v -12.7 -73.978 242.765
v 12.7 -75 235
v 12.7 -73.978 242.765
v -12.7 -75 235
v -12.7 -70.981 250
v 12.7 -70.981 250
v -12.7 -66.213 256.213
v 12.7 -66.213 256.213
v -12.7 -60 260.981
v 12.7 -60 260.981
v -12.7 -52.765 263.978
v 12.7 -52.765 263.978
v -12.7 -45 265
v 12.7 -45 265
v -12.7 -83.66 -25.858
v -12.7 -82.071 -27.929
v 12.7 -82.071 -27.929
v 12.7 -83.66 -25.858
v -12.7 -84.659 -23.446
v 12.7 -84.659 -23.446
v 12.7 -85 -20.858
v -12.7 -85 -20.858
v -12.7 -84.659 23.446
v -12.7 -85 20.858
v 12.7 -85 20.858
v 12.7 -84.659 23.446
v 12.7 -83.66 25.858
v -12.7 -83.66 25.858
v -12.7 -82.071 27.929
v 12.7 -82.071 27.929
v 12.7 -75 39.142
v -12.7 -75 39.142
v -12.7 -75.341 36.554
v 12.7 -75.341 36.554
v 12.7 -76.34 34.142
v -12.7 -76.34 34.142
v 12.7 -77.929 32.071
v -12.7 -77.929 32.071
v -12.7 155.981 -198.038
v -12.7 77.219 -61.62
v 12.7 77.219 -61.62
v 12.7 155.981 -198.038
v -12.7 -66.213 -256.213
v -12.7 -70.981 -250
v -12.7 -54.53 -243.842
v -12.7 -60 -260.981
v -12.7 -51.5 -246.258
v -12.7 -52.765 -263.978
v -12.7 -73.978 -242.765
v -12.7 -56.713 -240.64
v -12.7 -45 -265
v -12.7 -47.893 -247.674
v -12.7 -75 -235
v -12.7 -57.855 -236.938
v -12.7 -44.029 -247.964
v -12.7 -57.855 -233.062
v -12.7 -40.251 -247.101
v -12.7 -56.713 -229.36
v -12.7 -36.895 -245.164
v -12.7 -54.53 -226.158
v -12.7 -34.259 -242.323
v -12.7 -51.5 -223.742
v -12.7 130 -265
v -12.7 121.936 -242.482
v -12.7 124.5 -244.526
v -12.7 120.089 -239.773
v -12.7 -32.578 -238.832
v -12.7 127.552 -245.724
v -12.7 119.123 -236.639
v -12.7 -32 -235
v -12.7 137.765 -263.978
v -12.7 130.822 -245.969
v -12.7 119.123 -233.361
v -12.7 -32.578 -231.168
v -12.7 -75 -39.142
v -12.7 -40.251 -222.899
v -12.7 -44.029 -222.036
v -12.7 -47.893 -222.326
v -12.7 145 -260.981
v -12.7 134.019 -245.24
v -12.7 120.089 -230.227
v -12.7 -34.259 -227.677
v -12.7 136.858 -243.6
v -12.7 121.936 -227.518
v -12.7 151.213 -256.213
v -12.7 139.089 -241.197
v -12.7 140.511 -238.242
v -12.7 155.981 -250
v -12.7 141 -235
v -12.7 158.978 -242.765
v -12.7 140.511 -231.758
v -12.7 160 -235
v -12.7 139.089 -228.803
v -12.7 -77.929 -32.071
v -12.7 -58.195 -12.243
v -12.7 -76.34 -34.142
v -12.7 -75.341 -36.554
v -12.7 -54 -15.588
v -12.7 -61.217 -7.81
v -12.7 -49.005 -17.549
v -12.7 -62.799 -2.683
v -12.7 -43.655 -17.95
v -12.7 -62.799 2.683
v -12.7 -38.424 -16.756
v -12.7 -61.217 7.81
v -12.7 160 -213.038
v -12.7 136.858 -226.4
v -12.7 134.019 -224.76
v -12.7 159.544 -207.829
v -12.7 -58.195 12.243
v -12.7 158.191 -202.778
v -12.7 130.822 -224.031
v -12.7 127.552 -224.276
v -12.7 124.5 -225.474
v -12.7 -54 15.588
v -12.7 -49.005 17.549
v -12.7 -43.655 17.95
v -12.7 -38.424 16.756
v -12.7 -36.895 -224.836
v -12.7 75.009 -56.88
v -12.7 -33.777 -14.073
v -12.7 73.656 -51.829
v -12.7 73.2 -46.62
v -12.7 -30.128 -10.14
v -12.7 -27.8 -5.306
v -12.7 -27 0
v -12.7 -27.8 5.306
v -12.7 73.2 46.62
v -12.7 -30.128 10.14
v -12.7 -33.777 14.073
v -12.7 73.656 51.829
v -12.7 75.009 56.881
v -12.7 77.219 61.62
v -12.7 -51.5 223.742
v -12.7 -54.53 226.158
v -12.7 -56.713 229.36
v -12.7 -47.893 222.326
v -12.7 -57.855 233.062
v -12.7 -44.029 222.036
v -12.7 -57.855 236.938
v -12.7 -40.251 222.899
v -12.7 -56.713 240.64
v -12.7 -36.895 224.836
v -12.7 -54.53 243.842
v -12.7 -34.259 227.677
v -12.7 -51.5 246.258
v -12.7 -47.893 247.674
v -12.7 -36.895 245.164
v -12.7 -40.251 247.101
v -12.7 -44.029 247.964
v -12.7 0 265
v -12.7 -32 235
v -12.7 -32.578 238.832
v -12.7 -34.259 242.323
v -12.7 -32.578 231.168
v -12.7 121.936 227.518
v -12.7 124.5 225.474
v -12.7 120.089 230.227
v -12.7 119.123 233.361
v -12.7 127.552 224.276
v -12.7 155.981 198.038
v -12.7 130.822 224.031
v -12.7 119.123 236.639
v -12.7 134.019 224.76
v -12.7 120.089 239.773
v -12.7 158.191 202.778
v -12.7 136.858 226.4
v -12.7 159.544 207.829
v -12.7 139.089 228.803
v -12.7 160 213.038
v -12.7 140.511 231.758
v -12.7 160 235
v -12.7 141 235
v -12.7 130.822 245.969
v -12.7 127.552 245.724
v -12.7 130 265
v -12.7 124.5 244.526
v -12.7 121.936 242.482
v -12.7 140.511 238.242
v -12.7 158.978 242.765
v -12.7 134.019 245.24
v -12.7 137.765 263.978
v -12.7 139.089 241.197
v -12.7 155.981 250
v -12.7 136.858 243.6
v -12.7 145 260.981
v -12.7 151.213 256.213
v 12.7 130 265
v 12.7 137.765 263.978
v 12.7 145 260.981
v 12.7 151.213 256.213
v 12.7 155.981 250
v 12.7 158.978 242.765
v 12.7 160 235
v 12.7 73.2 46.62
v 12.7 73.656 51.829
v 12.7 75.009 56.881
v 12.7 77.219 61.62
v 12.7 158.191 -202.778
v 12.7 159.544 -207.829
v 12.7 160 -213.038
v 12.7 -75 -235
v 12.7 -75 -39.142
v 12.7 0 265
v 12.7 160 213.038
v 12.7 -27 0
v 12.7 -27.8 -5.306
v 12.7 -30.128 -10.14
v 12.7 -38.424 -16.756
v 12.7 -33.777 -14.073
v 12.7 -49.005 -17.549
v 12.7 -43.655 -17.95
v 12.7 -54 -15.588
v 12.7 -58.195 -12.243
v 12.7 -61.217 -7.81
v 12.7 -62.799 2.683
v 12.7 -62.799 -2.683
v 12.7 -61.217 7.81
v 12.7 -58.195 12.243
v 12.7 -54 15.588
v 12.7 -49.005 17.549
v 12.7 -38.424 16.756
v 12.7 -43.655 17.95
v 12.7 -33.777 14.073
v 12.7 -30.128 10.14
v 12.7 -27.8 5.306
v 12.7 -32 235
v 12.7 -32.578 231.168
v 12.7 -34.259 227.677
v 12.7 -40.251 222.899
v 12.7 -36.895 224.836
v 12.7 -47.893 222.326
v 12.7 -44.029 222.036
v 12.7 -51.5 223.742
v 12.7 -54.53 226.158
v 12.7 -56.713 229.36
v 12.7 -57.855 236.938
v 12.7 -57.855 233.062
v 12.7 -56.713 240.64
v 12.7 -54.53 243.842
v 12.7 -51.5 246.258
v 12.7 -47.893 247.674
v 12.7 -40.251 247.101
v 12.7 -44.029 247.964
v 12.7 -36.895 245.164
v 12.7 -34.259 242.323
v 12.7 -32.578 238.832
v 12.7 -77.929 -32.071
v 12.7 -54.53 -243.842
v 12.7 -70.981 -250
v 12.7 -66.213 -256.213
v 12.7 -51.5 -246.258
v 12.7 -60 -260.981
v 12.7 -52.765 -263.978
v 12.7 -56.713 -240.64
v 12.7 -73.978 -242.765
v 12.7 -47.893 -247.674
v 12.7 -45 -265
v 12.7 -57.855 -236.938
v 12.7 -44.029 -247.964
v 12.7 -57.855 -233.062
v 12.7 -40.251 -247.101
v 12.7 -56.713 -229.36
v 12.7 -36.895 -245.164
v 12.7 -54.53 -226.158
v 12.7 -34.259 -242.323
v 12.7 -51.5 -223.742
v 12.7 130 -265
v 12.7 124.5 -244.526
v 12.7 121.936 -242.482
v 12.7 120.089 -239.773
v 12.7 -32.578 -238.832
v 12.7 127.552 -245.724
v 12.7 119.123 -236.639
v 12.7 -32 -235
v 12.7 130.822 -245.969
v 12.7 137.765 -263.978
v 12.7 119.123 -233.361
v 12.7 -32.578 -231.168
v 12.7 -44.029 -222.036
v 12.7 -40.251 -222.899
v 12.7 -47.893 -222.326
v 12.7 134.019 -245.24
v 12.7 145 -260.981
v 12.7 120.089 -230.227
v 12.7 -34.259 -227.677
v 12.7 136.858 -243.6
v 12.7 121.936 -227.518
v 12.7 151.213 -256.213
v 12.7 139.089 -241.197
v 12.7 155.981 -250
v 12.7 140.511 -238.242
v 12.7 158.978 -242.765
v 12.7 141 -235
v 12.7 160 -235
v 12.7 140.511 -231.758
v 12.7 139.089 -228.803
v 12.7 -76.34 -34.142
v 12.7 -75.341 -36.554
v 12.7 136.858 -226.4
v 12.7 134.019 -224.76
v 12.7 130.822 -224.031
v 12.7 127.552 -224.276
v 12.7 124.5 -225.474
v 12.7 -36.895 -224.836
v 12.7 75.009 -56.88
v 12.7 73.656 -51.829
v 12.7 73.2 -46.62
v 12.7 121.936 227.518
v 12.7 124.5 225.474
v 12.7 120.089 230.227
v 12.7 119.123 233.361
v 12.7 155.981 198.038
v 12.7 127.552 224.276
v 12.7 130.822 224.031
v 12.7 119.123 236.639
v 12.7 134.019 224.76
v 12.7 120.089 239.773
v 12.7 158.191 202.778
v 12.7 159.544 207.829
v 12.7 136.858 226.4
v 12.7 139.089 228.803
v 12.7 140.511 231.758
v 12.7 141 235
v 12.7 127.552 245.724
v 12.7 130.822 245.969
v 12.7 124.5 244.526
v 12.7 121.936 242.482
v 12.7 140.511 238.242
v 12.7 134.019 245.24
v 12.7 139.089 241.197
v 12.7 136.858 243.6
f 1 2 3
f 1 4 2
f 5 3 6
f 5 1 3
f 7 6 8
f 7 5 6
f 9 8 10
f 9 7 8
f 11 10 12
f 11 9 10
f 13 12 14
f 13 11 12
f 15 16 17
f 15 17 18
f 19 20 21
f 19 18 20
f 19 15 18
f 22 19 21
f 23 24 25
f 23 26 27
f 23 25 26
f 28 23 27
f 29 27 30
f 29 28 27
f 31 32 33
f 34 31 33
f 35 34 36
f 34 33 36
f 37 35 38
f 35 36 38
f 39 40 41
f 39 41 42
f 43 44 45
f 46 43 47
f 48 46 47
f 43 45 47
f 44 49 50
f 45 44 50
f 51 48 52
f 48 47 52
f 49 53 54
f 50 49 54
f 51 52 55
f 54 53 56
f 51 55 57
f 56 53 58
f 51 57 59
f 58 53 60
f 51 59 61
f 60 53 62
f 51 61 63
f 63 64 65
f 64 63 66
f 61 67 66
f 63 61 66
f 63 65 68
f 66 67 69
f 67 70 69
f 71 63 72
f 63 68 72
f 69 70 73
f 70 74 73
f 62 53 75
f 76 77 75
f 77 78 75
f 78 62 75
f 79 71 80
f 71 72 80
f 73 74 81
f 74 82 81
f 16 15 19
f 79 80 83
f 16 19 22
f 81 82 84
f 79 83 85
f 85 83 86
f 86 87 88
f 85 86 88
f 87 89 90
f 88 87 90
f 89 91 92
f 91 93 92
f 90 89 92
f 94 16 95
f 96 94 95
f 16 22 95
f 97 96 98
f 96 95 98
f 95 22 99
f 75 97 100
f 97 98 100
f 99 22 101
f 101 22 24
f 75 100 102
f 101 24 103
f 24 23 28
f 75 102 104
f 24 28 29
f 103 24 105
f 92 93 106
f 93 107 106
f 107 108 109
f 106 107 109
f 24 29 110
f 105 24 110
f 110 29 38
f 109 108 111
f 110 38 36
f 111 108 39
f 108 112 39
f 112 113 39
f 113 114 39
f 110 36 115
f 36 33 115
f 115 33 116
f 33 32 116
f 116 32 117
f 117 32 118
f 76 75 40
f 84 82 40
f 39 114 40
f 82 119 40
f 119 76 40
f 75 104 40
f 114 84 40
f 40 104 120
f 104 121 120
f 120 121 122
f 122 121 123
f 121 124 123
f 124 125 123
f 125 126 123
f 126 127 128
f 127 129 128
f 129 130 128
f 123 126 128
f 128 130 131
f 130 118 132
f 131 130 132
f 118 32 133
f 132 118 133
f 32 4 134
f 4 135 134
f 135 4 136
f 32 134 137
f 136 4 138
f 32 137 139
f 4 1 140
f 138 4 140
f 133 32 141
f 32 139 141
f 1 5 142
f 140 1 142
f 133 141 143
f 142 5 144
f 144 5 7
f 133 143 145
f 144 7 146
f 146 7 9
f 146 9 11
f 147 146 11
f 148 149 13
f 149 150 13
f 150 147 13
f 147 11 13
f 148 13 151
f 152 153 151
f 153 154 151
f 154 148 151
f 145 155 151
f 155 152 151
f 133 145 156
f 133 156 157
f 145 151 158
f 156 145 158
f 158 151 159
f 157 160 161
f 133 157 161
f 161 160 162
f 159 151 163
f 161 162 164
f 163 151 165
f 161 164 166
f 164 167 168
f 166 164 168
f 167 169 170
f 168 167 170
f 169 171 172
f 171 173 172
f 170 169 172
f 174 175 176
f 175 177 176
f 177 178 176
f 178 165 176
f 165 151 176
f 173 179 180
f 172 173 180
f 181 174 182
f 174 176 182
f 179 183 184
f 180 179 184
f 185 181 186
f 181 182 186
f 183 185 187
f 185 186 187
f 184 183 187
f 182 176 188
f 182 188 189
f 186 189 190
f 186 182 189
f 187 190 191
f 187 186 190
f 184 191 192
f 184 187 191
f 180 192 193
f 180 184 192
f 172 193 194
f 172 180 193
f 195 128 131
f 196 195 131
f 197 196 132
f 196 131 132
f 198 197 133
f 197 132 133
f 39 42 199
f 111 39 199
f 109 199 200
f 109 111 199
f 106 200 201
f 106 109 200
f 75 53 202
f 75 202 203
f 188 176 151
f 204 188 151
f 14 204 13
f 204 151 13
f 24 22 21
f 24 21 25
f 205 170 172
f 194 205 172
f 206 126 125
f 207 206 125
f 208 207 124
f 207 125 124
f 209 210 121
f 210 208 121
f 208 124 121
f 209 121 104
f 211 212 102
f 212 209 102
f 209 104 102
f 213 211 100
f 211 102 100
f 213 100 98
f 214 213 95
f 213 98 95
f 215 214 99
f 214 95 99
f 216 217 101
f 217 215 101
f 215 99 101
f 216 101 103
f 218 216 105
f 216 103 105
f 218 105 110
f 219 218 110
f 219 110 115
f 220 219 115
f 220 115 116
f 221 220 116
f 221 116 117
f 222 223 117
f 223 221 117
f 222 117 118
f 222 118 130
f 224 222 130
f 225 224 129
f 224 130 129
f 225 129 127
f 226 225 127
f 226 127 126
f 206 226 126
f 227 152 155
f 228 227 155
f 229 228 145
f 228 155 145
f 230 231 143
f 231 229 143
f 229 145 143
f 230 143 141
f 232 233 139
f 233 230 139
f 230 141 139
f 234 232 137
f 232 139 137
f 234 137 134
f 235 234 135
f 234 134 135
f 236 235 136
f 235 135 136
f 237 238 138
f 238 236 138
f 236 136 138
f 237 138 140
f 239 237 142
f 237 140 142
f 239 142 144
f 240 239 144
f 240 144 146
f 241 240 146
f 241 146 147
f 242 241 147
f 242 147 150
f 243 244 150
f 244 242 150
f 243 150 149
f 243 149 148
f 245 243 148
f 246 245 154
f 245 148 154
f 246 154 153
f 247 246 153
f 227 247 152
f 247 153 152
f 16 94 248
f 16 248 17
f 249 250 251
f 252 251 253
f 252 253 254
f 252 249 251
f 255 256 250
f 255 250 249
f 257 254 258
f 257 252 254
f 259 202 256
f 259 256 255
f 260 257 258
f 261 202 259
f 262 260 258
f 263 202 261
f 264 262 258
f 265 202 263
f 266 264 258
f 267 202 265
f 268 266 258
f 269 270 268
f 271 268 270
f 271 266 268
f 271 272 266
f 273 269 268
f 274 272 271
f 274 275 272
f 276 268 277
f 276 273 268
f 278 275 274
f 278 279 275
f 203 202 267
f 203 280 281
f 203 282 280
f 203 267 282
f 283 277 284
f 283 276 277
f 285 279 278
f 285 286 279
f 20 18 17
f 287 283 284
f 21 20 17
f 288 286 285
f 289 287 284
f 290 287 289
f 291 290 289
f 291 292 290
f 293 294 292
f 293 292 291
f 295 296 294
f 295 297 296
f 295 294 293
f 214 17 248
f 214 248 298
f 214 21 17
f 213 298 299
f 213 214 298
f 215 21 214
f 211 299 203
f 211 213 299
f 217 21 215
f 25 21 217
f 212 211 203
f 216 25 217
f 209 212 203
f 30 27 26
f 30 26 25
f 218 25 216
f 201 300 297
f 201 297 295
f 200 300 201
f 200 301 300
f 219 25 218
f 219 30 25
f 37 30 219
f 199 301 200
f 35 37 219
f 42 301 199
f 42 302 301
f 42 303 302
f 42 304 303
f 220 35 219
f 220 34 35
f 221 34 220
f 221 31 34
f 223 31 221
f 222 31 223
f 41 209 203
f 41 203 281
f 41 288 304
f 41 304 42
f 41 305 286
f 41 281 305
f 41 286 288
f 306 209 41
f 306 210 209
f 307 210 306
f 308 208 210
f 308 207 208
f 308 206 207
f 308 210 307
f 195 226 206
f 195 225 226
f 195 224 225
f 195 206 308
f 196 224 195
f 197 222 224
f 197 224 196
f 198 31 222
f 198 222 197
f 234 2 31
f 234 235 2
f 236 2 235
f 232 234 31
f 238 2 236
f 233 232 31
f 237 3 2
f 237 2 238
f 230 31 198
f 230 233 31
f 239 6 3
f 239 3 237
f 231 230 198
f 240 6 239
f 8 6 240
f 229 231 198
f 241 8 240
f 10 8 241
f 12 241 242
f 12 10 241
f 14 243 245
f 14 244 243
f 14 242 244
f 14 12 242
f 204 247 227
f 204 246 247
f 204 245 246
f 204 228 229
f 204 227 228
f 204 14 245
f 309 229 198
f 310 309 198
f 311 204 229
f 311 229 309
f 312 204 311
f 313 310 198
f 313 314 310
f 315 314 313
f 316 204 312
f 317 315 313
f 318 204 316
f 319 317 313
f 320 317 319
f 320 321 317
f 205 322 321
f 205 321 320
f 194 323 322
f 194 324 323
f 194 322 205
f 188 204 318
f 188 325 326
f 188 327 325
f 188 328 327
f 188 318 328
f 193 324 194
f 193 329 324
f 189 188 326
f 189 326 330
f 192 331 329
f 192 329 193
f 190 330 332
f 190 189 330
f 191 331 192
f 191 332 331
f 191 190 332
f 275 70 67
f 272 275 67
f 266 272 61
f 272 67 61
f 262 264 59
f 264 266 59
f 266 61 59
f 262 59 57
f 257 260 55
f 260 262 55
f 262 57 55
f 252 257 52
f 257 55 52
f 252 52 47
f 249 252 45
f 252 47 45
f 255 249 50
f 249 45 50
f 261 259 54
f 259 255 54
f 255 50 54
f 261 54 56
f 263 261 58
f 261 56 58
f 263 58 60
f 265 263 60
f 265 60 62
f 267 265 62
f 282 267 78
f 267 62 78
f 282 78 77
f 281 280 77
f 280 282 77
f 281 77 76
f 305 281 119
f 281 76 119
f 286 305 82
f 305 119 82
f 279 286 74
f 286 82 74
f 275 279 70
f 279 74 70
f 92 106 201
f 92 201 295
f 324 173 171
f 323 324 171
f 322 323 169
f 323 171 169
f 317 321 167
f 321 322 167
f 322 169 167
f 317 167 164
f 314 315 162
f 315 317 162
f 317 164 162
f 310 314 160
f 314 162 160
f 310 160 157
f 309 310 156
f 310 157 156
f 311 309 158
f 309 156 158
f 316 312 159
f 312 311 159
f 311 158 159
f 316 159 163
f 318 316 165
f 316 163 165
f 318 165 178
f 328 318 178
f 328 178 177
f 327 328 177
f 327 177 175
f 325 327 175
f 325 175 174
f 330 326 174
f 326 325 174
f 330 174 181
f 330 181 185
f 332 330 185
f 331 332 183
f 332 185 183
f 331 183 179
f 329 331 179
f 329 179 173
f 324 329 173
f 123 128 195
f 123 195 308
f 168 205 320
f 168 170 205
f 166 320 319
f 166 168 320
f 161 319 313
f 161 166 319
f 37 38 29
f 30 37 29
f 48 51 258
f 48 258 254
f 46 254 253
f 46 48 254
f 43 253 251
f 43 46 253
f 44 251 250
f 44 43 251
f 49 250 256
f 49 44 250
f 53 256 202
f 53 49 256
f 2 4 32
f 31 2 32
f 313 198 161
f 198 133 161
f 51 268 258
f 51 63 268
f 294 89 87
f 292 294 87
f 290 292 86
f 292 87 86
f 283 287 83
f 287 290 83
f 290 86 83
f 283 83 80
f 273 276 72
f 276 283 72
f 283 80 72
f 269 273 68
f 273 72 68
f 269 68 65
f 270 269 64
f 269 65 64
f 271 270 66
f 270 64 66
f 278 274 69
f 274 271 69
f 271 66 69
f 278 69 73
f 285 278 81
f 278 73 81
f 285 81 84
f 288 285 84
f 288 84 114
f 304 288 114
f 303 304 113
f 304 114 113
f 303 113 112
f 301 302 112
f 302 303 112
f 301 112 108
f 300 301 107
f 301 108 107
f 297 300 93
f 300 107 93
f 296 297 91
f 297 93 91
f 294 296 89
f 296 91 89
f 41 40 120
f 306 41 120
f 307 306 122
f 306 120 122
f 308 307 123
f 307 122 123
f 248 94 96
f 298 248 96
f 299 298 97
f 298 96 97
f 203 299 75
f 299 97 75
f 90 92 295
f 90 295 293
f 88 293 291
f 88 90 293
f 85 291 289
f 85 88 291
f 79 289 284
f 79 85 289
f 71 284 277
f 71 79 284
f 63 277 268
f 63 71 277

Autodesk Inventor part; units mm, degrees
ref_plane "YZ Plane" through (0, 0, 0) normal (1, 0, 0) x (0, 1, 0)
ref_plane "XZ Plane" through (0, 0, 0) normal (0, 1, 0) x (-1, 0, 0)
ref_plane "XY Plane" through (0, 0, 0) normal (0, 0, 1) x (1, 0, 0)
sketch "Sketch1" plane through (0, 0, 0) normal (1, 0, 0) x (0, 1, 0)
  line L0 (45, 0) -> (0, 0)
  circle A0 centre (130, 235) radius 11
  line L1 (73.2002, 0) -> (73.2002, 46.6199)
  line L2 (77.2194, 61.6199) -> (155.9808, 198.0385)
  line L3 (160, 213.0385) -> (160, 235)
  arc A1 (160, 235) -> (130, 265) centre (130, 235) ccw
  line L4 (130, 235) -> (130, 265) construction
  line L5 (130, 235) -> (160, 235) construction
  line L6 (130, 265) -> (-45, 265)
  circle A2 centre (-45, 0) radius 18
  line L7 (0, 0) -> (0, 265)
  circle A3 centre (-45, 235) radius 13
  arc A4 (-45, 265) -> (-75, 235) centre (-45, 235) ccw
  line L8 (-45, 235) -> (-75, 235) construction
  line L9 (-45, 235) -> (-45, 265) construction
  line L10 (-75, 235) -> (-75, 39.1421)
  line L11 (0, 0) -> (-45, 0)
  circle A5 centre (130, -235) radius 11
  line L12 (73.2002, 0) -> (73.2002, -46.6199)
  line L13 (77.2194, -61.6199) -> (155.9808, -198.0385)
  line L14 (160, -213.0385) -> (160, -235)
  arc A6 (130, -265) -> (160, -235) centre (130, -235) ccw
  line L15 (130, -265) -> (-45, -265)
  circle A7 centre (-45, -235) radius 13
  arc A8 (-75, -235) -> (-45, -265) centre (-45, -235) ccw
  line L16 (-45, -235) -> (-75, -235) construction
  line L17 (-75, -235) -> (-75, -39.1421)
  arc A9 (155.9808, 198.0385) -> (160, 213.0385) centre (130, 213.0385) ccw
  arc A10 (77.2194, 61.6199) -> (73.2002, 46.6199) centre (103.2002, 46.6199) ccw
  arc A11 (73.2002, -46.6199) -> (77.2194, -61.6199) centre (103.2002, -46.6199) ccw
  arc A12 (160, -213.0385) -> (155.9808, -198.0385) centre (130, -213.0385) ccw
  line L18 (-77.9289, 32.0711) -> (-82.0711, 27.9289)
  line L19 (-85, 20.8579) -> (-85, 0)
  line L20 (-77.9289, -32.0711) -> (-82.0711, -27.9289)
  line L21 (-85, -20.8579) -> (-85, 0)
  arc A13 (-77.9289, 32.0711) -> (-75, 39.1421) centre (-85, 39.1421) ccw
  arc A14 (-82.0711, 27.9289) -> (-85, 20.8579) centre (-75, 20.8579) ccw
  arc A15 (-85, -20.8579) -> (-82.0711, -27.9289) centre (-75, -20.8579) ccw
  arc A16 (-75, -39.1421) -> (-77.9289, -32.0711) centre (-85, -39.1421) ccw
  point P0 (73.2002, 54.6584)
  point P1 (160, 205)
  point P2 (-75, -35)
  point P3 (48.2002, -10.5242)
  point P4 (73.2002, -54.6584)
  point P5 (160, -205)
  point P6 (-85, 25)
  point P7 (-75, 35)
  point P8 (-85, -25)
  dimension "d1" = 22
  dimension "d2" = 470
  dimension "d3" = 90
  dimension "d4" = 36
  dimension "d7" = 30
  dimension "d8" = 26
  dimension "d9" = 90
  dimension "d11" = 25
  dimension "d12" = 85
  dimension "d13" = 90
  dimension "d14" = 30
  dimension "d15" = 30
  dimension "d16" = 30
  dimension "d19" = 45
  dimension "d20" = 40
  dimension "d21" = 50
  dimension "d22" = 10
extrude "Extrusion1" add sketch "Sketch1" along normal mid plane 25.4
properties part number "Balancim_Duplicador"
